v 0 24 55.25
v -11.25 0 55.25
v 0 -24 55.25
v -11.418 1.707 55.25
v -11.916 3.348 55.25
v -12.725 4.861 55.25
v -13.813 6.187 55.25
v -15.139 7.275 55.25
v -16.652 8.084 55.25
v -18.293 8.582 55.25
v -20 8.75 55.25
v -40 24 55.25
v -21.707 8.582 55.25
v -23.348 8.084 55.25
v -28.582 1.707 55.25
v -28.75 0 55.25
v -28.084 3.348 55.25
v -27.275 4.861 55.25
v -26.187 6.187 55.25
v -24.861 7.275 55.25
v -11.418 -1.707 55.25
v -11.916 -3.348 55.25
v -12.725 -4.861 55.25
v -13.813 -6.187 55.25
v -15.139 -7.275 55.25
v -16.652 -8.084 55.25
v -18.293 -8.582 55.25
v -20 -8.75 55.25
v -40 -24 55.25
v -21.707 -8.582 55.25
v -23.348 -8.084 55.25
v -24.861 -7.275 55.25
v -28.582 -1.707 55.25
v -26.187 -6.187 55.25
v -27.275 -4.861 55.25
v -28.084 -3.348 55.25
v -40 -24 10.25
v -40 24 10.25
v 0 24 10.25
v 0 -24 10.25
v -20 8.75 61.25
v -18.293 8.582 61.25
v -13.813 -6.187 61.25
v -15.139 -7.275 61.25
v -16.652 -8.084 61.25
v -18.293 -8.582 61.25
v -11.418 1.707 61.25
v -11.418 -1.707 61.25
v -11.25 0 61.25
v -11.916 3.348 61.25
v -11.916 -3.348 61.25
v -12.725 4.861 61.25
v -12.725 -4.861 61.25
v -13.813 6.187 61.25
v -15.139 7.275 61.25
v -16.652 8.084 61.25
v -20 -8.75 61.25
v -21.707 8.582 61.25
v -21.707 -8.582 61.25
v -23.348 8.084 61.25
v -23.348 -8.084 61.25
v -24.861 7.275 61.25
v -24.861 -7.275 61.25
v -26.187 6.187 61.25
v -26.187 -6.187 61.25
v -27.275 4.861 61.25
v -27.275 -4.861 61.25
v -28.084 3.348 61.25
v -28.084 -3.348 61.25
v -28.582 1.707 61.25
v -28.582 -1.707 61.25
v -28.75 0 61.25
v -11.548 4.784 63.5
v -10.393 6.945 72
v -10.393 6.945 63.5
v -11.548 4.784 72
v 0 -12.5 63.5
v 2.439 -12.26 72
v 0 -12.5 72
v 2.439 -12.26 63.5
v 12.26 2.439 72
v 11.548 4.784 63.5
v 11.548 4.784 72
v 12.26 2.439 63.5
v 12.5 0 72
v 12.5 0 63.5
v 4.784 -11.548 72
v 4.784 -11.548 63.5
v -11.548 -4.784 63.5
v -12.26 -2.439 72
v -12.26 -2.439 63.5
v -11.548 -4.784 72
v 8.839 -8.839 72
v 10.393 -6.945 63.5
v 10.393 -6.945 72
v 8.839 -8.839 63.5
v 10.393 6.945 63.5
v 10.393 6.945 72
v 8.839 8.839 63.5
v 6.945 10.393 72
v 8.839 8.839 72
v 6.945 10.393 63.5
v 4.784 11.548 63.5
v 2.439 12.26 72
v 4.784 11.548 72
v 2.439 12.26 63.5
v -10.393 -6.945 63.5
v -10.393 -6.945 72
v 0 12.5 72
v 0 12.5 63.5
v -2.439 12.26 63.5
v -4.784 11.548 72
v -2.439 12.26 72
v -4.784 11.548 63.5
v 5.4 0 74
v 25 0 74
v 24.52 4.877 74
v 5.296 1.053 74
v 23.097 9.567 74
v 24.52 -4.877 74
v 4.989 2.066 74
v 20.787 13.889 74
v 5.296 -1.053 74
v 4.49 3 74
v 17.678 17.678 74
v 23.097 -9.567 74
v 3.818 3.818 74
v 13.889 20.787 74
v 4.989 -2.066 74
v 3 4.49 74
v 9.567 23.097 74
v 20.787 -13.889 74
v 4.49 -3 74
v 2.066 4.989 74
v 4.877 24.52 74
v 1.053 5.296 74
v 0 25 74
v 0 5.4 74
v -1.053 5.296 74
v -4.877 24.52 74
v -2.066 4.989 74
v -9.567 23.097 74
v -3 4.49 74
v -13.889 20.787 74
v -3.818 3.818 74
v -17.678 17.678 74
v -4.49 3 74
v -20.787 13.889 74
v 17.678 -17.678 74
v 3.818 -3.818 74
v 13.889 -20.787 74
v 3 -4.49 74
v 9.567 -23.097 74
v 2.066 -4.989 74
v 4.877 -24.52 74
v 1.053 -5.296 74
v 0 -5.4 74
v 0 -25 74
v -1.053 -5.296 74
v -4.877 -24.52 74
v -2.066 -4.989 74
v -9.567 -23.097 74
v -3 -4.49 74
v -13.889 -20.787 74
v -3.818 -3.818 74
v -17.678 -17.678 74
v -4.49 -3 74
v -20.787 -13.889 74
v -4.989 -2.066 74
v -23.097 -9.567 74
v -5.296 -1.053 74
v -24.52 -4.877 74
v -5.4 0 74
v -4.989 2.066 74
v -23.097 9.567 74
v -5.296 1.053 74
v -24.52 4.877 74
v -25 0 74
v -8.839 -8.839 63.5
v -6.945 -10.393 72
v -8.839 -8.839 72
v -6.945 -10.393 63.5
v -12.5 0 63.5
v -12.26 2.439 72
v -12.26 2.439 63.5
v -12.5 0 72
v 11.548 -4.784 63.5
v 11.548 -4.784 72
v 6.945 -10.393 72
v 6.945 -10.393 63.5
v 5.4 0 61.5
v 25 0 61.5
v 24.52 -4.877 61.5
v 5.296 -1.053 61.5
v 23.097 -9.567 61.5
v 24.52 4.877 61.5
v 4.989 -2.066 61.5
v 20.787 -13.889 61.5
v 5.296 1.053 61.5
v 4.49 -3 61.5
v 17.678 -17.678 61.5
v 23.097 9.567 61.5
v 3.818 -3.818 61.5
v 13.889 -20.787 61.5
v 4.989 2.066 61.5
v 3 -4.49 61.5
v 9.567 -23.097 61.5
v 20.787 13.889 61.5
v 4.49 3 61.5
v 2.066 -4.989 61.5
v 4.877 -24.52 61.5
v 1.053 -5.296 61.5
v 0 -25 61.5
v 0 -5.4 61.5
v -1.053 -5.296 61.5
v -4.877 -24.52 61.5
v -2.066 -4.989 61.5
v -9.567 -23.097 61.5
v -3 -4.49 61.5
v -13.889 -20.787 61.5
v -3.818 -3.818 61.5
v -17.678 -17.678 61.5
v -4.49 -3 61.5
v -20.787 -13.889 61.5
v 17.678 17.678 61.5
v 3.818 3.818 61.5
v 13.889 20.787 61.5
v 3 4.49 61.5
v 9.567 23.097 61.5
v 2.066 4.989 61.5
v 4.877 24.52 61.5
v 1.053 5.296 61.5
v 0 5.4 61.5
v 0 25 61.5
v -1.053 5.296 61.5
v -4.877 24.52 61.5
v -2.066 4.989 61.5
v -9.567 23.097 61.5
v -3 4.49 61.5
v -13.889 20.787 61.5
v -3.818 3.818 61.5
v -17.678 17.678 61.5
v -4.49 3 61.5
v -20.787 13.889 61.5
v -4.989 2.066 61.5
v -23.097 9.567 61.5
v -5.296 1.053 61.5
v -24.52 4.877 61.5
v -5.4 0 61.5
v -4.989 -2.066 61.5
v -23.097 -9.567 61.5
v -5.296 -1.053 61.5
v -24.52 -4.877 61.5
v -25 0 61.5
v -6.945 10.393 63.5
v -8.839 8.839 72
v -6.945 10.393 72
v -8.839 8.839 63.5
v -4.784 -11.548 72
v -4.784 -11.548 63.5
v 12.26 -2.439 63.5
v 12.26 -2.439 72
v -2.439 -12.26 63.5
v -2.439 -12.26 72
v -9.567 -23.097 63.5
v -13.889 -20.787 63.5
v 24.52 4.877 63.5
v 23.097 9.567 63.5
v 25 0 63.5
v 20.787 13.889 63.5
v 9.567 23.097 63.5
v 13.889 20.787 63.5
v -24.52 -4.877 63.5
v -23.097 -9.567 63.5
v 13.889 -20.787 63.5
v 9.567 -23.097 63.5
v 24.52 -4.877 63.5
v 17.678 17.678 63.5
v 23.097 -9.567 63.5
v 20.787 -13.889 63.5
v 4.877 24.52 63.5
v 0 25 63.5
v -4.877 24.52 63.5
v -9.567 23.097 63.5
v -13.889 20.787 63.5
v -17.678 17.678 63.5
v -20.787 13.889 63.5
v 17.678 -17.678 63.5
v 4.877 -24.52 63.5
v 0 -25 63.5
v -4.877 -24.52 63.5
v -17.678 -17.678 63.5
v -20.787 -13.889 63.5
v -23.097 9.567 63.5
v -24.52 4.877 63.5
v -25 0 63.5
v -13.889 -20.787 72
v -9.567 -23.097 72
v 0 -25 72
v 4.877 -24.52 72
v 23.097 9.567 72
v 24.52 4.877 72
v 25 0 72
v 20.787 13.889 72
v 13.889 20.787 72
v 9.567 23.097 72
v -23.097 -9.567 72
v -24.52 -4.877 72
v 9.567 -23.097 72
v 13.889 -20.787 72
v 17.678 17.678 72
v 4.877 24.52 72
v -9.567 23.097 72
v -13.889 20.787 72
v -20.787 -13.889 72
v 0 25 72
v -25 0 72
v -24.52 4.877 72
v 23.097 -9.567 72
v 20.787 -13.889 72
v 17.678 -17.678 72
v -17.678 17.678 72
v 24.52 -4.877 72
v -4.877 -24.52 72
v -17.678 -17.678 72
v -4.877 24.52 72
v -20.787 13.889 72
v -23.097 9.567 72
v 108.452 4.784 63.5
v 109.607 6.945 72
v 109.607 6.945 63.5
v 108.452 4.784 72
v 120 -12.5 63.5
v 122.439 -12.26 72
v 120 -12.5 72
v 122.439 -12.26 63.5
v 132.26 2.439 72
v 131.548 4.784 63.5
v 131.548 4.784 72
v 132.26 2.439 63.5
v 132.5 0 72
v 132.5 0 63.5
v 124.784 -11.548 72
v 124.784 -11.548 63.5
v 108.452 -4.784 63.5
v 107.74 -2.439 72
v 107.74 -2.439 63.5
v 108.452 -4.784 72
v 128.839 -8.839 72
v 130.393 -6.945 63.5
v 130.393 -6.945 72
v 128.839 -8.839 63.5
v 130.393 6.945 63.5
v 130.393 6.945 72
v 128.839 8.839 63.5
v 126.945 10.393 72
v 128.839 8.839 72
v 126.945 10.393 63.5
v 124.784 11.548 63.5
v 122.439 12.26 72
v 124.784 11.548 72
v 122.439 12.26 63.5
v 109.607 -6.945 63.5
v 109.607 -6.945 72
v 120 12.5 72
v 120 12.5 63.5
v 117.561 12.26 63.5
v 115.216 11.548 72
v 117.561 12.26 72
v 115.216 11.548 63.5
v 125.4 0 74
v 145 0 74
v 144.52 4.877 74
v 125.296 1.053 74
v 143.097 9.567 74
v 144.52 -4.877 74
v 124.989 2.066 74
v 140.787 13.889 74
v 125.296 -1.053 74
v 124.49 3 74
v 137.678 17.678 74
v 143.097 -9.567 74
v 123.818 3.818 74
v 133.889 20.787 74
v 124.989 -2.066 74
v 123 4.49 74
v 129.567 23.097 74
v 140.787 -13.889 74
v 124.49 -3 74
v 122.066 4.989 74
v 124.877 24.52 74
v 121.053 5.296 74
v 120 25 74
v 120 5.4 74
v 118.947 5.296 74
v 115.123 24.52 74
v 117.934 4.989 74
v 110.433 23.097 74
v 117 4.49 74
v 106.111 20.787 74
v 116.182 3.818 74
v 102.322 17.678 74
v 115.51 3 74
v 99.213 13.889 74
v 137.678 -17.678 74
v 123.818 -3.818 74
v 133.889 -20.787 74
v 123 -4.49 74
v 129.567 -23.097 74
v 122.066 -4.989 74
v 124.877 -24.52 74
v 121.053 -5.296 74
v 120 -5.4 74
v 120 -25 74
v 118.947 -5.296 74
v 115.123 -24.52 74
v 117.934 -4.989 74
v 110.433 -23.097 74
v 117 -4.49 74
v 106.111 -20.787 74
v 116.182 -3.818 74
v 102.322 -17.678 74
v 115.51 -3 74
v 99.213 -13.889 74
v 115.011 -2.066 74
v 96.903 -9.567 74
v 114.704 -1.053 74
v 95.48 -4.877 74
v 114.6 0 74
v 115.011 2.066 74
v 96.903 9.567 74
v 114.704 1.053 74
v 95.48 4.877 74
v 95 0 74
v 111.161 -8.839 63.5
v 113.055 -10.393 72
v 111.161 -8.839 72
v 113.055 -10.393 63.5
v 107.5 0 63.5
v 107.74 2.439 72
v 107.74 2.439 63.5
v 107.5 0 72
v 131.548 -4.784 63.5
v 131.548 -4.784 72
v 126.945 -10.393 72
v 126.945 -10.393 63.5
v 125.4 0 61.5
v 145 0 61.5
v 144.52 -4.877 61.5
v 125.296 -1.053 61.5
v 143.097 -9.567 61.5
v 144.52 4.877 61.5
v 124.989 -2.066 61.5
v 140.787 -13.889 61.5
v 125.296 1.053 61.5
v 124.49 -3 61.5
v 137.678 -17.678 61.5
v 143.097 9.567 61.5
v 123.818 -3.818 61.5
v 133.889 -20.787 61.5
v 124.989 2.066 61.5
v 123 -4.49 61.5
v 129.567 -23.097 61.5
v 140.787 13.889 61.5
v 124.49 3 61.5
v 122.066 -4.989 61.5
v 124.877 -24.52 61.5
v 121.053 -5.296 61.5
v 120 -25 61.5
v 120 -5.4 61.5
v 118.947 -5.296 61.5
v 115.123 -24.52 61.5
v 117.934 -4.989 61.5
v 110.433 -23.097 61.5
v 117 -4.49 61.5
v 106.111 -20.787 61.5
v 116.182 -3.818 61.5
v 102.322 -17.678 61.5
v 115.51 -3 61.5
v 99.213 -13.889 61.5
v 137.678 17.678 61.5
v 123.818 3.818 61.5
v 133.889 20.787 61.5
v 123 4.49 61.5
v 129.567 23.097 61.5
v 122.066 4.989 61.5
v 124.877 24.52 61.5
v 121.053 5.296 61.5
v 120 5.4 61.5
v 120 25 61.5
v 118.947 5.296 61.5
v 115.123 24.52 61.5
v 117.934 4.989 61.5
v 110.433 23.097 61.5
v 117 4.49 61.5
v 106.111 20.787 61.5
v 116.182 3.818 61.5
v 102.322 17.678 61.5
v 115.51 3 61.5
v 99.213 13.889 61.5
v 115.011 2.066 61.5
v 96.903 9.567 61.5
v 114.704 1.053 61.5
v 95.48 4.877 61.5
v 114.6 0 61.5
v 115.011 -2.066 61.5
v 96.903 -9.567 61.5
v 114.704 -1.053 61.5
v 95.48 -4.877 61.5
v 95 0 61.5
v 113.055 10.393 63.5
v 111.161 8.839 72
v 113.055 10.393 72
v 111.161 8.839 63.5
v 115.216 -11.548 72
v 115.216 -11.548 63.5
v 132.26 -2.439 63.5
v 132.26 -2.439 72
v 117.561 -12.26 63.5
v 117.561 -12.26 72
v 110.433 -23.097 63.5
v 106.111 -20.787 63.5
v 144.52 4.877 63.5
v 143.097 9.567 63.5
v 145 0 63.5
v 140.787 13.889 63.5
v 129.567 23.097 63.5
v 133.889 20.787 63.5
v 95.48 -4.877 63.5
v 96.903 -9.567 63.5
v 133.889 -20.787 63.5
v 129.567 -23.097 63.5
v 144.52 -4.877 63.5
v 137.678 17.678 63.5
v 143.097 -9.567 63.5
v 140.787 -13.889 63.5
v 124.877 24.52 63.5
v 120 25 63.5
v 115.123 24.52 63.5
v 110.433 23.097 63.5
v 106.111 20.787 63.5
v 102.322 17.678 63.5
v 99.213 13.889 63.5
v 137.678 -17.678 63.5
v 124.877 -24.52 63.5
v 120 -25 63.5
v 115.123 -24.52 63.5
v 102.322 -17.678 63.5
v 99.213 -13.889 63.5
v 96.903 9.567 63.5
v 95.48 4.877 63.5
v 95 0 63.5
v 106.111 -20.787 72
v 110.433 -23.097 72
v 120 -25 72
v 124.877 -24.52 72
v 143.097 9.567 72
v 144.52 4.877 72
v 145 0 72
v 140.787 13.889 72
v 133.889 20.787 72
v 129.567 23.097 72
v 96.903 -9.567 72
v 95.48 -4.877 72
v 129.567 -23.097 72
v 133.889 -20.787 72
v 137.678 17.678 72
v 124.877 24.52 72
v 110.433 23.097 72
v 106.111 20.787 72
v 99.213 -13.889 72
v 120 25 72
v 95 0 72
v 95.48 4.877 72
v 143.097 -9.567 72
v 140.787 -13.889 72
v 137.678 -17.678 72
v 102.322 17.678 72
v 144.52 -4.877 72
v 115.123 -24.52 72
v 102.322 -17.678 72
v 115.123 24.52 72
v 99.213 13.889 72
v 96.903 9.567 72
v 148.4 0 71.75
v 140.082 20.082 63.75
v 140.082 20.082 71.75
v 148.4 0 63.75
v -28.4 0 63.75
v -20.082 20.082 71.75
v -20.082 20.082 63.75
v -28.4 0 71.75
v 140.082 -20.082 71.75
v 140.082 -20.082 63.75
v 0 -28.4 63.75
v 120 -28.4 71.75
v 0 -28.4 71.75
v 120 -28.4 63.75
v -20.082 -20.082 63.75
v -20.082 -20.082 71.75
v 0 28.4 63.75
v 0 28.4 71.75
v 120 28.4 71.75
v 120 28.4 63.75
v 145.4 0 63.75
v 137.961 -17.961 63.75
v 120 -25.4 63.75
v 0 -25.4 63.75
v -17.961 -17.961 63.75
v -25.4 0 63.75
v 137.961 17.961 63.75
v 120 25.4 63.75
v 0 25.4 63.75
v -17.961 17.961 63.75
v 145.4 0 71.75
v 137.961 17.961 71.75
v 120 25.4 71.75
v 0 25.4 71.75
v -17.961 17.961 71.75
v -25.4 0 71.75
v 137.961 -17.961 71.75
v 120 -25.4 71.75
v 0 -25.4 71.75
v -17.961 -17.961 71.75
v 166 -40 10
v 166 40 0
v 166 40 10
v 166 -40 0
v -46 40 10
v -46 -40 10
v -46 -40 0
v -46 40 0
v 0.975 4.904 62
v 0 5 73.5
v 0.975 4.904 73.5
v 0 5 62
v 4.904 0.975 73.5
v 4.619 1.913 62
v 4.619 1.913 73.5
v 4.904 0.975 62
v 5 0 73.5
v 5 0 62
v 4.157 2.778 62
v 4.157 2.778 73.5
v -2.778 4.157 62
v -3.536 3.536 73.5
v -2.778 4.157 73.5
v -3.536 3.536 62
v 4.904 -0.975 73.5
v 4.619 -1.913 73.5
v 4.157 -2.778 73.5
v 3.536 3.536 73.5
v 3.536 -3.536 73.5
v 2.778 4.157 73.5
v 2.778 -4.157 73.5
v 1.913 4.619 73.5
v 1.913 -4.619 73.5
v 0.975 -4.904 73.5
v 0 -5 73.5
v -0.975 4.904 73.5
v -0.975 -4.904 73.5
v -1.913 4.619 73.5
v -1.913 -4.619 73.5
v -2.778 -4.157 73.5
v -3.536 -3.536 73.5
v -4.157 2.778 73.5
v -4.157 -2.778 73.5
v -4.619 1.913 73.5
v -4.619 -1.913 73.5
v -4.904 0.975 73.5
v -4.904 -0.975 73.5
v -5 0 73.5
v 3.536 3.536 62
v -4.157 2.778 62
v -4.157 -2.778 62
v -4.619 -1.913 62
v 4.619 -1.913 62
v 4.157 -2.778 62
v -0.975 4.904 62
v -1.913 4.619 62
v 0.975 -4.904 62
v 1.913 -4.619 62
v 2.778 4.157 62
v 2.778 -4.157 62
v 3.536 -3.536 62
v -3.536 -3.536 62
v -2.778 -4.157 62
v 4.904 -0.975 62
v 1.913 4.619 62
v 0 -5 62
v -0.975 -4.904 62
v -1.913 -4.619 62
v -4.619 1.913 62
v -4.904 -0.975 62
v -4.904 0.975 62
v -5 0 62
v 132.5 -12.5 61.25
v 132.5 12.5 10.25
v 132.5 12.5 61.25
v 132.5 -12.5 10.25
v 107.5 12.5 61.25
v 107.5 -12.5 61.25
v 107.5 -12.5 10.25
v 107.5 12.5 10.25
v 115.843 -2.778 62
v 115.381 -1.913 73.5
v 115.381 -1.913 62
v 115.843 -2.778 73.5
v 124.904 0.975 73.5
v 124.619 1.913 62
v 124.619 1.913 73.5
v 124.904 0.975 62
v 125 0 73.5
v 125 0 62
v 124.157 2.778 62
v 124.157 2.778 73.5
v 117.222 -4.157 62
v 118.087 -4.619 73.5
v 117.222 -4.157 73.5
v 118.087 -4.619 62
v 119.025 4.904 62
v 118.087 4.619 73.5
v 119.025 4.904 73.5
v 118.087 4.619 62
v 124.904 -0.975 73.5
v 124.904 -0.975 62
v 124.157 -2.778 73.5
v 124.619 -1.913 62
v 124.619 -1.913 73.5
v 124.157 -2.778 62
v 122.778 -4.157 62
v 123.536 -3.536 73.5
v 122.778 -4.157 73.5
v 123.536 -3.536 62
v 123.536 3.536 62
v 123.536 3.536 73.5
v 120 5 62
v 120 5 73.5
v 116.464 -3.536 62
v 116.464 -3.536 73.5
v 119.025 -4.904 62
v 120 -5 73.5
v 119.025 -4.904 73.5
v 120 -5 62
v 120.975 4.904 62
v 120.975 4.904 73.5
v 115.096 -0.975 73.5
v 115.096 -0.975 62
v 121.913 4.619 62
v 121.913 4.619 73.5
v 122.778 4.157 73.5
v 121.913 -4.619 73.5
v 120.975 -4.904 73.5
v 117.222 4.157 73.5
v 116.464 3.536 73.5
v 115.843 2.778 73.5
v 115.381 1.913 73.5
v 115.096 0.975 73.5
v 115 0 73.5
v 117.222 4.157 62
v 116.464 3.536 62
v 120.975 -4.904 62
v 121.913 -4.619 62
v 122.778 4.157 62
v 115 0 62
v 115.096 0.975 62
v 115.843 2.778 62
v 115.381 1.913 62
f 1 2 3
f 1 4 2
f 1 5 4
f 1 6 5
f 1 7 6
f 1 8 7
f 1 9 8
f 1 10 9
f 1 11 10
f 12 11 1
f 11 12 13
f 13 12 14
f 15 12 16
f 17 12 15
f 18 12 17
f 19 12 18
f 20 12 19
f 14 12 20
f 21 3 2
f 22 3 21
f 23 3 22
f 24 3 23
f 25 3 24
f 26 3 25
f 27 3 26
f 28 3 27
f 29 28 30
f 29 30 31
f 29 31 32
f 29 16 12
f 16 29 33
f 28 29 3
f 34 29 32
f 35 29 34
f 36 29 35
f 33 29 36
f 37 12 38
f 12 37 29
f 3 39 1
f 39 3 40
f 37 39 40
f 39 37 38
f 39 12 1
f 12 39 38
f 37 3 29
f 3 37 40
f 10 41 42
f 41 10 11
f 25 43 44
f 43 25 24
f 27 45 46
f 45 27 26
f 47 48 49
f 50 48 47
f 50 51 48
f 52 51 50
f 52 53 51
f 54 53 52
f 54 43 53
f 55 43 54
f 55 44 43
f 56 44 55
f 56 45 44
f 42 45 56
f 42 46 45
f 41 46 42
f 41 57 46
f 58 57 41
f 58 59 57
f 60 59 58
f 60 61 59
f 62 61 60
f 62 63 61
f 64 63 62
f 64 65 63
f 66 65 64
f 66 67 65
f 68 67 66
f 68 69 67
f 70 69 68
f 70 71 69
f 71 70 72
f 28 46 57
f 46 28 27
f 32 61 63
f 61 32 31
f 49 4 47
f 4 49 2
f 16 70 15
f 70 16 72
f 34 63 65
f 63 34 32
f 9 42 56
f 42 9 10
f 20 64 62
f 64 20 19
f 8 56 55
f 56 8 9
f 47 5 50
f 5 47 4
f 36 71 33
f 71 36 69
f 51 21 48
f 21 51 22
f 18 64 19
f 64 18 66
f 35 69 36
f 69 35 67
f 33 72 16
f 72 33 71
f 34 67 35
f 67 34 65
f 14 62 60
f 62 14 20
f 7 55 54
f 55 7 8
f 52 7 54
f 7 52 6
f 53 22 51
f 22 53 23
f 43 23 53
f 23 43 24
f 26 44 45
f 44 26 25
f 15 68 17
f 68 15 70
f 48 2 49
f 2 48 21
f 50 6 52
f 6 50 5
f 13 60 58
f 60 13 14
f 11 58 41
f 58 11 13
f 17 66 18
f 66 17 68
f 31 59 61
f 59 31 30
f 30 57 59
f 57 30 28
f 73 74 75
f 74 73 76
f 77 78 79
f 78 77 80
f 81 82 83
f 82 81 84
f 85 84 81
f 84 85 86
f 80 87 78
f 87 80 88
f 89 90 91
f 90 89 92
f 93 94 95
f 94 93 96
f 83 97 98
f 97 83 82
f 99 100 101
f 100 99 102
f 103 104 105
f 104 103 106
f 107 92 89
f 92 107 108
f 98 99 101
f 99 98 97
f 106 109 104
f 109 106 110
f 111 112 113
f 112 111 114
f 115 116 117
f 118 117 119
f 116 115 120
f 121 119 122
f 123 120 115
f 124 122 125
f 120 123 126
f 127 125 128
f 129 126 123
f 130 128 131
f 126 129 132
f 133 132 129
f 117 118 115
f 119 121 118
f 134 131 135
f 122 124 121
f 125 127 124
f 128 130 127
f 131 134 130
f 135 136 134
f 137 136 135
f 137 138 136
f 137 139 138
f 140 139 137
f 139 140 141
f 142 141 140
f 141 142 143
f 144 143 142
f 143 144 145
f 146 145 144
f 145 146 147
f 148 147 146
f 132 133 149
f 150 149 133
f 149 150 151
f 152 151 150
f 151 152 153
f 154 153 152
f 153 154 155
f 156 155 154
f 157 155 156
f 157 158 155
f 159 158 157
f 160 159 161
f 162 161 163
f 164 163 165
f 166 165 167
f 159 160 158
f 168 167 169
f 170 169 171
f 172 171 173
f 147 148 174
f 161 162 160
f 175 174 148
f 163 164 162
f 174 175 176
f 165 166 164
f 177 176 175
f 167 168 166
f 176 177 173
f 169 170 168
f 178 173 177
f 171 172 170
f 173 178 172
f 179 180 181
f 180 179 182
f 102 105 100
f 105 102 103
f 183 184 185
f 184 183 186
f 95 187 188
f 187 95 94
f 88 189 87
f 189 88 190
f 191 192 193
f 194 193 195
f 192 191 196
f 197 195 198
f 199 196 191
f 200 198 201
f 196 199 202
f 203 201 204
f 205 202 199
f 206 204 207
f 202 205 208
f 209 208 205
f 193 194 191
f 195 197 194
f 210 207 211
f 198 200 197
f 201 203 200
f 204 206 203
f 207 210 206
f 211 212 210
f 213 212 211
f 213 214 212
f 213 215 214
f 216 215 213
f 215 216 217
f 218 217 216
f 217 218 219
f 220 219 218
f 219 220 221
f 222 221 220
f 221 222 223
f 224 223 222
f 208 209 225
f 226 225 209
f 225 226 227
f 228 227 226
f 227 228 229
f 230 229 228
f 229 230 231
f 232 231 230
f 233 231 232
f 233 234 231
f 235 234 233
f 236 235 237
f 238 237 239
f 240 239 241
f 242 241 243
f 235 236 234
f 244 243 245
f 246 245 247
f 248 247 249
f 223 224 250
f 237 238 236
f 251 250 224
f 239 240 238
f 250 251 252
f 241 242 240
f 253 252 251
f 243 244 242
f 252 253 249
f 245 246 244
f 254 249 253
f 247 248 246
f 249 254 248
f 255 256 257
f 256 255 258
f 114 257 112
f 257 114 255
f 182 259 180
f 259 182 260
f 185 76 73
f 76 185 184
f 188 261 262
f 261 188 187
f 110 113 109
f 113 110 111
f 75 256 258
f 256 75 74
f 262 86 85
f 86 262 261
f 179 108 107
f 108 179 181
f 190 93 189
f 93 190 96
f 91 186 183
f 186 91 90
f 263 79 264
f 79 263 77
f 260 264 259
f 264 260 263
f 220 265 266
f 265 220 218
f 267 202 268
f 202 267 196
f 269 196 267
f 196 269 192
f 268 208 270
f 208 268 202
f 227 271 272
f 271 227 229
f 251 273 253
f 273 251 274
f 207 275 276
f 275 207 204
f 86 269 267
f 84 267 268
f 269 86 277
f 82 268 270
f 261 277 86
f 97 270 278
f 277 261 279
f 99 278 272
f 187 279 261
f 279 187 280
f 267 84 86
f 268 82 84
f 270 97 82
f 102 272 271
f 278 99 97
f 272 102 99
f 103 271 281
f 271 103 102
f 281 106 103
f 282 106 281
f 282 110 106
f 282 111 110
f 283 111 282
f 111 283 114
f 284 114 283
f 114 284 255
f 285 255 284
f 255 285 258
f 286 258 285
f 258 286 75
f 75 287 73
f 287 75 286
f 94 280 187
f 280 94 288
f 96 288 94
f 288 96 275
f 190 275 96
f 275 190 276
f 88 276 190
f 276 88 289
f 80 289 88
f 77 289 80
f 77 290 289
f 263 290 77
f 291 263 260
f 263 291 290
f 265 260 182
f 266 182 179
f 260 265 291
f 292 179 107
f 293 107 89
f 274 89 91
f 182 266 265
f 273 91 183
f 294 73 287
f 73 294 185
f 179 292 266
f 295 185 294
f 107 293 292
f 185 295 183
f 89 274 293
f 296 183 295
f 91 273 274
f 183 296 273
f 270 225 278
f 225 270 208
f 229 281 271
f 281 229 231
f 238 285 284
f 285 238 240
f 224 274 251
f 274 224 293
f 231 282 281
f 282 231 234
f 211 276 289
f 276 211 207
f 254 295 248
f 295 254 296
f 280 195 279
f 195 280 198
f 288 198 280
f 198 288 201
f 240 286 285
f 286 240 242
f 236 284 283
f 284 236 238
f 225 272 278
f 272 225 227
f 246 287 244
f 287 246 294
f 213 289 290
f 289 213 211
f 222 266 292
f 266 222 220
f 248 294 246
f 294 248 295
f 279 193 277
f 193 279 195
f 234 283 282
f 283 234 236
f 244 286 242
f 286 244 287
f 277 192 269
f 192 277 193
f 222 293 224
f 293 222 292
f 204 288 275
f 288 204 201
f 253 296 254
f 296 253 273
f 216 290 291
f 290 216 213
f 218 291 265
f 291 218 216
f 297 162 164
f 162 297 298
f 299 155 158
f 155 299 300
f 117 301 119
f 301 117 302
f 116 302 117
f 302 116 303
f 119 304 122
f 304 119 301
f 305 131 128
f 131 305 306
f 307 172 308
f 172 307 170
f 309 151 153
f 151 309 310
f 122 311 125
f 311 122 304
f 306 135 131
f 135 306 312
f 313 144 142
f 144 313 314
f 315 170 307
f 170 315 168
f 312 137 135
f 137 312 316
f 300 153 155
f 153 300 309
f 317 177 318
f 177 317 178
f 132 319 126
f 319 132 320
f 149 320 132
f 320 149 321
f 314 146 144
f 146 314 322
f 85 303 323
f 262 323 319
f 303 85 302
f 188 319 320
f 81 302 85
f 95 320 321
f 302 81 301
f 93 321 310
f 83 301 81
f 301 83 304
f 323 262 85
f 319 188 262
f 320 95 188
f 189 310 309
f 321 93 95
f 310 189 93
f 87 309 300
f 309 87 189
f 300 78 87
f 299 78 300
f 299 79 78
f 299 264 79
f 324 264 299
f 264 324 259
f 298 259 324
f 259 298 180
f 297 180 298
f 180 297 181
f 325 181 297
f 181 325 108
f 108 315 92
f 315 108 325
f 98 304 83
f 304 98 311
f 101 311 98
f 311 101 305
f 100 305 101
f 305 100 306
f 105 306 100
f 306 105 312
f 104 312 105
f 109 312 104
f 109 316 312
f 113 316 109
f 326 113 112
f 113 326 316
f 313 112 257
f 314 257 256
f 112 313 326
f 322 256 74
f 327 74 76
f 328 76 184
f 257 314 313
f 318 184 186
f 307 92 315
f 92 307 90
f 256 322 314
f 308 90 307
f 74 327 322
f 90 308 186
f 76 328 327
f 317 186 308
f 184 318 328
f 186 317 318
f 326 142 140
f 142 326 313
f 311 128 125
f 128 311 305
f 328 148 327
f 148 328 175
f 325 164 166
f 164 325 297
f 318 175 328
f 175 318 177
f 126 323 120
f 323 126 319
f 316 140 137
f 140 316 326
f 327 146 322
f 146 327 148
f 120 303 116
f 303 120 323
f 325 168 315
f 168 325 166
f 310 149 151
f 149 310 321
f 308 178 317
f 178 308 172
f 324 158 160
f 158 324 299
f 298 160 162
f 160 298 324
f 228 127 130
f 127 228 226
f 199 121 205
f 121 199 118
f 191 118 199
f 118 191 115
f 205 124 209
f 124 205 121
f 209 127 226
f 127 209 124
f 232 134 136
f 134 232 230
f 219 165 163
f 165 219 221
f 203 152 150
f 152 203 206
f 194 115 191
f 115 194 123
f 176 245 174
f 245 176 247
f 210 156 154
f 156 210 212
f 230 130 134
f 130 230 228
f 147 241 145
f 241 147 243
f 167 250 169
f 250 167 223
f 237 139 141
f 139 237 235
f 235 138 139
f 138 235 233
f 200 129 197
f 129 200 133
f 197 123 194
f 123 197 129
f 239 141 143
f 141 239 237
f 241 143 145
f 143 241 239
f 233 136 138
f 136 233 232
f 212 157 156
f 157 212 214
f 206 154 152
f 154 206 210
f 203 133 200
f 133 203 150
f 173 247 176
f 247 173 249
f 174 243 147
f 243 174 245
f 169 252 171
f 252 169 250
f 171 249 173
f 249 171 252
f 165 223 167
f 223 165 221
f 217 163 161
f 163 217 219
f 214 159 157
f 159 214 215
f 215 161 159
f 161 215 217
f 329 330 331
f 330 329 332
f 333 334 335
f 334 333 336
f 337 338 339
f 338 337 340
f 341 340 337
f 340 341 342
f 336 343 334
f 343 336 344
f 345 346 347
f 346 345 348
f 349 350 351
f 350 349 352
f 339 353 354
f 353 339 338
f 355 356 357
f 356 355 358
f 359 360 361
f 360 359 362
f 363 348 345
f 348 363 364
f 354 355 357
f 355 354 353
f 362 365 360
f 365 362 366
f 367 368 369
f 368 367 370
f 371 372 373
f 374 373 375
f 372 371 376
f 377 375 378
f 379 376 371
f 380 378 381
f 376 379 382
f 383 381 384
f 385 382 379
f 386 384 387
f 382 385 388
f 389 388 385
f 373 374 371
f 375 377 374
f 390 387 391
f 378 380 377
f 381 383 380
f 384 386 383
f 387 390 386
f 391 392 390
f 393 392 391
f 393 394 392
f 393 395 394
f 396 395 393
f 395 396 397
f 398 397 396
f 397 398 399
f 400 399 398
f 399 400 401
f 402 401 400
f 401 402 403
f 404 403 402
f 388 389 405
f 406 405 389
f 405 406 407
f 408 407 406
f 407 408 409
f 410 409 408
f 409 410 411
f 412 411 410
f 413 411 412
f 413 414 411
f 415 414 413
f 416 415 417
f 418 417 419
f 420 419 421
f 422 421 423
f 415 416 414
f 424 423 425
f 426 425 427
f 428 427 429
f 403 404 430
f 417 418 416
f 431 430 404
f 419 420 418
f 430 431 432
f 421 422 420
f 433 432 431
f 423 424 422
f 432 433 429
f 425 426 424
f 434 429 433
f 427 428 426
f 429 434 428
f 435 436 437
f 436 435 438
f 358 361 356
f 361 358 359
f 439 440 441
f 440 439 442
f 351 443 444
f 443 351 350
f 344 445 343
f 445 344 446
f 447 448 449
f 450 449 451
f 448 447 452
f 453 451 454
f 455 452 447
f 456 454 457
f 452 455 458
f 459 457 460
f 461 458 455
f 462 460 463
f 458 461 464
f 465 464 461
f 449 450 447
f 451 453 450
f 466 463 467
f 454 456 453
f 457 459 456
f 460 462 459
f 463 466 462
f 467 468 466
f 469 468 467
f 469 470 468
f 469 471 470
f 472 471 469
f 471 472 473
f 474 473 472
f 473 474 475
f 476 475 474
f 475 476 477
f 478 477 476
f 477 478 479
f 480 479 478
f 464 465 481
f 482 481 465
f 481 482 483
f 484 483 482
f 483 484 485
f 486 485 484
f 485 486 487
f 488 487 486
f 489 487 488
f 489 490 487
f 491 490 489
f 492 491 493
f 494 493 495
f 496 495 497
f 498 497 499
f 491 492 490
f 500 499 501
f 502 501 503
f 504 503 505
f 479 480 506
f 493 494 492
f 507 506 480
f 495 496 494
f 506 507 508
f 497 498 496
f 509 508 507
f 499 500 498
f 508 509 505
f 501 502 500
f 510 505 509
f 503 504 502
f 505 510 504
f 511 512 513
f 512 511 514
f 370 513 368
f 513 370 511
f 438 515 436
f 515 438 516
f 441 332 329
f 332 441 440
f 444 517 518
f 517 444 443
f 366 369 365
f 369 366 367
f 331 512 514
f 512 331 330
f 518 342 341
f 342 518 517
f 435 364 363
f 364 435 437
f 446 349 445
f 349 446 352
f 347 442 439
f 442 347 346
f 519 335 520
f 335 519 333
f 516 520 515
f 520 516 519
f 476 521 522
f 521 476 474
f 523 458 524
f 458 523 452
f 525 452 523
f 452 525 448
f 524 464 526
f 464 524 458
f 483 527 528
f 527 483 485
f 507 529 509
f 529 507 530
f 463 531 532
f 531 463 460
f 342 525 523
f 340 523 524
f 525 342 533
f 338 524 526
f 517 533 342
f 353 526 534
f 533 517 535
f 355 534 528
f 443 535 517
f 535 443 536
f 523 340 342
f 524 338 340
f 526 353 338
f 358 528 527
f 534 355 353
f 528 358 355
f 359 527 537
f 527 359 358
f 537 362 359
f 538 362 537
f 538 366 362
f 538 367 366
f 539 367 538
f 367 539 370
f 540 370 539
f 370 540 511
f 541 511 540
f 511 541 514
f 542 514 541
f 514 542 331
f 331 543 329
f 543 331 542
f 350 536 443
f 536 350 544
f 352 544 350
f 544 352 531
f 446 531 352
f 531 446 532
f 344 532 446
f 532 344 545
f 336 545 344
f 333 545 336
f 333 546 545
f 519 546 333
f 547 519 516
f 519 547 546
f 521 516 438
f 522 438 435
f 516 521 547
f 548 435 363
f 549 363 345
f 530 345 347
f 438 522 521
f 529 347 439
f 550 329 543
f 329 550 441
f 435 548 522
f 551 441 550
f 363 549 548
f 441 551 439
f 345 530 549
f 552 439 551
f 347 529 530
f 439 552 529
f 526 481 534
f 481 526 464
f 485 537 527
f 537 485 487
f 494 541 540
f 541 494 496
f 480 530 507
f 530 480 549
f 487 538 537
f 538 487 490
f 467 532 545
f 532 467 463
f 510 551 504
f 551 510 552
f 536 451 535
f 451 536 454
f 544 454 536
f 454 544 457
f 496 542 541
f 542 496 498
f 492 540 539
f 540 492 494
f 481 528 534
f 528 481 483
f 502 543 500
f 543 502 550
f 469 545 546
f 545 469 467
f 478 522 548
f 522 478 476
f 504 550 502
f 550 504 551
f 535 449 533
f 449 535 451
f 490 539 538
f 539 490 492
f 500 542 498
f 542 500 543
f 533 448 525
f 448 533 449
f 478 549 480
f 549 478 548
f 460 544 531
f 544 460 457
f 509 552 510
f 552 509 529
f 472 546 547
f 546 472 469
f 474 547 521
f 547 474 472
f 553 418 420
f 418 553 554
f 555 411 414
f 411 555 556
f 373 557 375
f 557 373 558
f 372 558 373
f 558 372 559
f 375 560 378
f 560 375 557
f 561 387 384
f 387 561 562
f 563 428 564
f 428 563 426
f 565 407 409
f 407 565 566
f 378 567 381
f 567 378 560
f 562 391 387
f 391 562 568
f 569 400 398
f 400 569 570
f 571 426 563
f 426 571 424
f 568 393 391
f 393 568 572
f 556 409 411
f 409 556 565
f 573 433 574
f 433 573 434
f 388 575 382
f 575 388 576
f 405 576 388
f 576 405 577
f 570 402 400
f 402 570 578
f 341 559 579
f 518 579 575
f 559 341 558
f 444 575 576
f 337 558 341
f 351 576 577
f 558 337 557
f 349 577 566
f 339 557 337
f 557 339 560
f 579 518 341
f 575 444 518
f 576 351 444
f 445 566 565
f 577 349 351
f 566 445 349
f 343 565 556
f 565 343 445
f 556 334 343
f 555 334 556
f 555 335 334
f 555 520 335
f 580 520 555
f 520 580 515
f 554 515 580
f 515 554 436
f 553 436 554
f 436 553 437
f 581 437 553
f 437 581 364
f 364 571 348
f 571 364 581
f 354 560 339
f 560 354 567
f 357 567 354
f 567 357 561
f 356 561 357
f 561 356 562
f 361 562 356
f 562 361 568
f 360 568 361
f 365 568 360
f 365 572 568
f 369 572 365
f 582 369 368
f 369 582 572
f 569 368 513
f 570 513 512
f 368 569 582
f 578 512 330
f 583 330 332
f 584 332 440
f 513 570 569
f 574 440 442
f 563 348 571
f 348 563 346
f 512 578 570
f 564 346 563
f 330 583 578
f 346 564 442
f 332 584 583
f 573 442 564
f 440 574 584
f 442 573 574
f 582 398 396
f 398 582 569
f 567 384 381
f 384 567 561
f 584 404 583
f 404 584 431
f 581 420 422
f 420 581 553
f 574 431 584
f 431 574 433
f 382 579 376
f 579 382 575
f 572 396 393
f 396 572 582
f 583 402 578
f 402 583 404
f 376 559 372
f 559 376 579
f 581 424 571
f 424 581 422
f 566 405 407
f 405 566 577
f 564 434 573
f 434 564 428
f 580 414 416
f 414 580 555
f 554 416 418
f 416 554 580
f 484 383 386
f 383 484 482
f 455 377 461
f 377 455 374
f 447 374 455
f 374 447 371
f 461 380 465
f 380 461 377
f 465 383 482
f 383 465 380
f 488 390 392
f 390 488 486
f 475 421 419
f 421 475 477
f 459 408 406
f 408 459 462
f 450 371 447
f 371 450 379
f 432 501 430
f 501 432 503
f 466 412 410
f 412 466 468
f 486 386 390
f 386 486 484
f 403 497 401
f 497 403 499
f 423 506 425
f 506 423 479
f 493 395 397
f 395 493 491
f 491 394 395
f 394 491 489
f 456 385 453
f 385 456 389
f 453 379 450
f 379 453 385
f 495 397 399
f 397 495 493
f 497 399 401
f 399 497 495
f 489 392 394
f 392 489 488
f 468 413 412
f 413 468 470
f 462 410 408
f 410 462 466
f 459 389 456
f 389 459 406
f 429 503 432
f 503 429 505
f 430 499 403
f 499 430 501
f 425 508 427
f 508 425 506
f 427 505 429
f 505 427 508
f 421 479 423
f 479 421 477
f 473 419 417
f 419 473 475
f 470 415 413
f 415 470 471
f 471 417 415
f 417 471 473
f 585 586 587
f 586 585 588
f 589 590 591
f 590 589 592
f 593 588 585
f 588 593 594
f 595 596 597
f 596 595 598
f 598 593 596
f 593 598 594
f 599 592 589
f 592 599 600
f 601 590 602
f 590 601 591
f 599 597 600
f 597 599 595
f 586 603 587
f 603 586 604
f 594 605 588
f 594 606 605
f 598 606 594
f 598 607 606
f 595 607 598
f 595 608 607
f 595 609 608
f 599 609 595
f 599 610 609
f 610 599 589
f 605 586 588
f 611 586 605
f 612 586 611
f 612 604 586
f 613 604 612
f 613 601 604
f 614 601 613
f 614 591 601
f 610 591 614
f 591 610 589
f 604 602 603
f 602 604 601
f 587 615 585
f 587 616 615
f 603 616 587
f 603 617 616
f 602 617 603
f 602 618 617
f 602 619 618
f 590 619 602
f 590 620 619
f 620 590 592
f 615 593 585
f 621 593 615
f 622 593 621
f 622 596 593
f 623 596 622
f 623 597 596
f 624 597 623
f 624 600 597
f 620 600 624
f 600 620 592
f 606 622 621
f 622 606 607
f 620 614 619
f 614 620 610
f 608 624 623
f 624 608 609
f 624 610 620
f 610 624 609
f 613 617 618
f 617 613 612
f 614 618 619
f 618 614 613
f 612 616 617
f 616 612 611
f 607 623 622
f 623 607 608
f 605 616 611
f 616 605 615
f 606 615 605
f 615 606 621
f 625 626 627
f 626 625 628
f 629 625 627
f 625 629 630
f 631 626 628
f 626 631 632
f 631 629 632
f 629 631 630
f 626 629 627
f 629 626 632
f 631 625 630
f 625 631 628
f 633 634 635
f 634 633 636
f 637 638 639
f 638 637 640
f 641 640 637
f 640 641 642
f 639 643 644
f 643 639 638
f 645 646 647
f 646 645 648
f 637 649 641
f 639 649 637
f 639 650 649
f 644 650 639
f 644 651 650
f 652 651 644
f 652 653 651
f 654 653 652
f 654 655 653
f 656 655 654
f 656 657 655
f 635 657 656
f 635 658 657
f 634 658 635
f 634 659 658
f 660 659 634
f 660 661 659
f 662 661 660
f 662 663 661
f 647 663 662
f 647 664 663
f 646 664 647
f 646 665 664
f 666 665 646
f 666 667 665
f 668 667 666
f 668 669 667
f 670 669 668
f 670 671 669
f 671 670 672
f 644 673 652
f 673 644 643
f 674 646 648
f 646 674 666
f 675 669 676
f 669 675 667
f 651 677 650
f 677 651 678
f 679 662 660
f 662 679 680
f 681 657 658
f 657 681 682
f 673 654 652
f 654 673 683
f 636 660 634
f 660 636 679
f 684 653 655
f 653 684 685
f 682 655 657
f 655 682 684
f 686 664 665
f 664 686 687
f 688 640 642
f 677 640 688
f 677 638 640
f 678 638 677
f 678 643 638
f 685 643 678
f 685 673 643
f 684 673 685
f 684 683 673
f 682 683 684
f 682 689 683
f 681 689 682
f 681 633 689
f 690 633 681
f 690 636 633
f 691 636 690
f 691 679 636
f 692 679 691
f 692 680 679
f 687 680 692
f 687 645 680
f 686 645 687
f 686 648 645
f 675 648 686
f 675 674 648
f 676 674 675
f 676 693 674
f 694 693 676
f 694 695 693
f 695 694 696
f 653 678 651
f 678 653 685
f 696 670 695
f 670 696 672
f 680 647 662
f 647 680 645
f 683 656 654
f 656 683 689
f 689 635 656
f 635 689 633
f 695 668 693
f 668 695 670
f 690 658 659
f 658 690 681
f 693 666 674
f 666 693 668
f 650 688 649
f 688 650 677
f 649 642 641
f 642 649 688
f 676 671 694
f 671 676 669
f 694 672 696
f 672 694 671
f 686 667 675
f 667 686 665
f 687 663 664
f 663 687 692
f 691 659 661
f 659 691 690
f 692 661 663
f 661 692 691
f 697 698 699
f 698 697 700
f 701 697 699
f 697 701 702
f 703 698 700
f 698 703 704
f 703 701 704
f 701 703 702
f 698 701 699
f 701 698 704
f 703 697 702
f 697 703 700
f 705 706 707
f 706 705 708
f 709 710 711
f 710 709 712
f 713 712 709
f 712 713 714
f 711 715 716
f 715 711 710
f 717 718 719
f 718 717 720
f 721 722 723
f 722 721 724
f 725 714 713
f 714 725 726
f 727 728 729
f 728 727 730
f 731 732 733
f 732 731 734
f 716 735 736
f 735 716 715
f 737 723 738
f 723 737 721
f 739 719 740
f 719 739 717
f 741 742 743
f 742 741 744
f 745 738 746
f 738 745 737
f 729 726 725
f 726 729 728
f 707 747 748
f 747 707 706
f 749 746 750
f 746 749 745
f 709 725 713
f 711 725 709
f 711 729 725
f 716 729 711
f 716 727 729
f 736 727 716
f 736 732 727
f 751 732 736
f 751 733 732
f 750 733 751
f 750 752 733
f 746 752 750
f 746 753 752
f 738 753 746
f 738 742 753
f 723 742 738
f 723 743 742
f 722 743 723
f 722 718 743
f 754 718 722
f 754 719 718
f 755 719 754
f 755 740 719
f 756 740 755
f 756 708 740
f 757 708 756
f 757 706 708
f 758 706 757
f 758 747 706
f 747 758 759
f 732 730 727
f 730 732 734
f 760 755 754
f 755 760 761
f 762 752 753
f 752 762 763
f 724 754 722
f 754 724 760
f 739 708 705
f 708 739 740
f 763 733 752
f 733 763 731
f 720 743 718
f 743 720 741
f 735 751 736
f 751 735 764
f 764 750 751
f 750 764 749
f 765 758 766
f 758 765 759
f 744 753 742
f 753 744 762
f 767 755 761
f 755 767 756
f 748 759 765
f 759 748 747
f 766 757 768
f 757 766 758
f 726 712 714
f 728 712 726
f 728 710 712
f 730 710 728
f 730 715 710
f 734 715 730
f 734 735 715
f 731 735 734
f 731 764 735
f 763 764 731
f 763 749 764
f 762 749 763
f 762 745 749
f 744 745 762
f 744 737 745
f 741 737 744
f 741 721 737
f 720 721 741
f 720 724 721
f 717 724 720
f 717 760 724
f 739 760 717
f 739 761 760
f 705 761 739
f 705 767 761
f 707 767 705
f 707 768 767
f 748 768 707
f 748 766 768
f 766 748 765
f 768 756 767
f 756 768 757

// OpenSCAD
$fn = 32;

// ------------------------------------------------------------------------
// Motor belt drive: span 120 mm, pulleys d50, belt 8 mm wide
// Every part is its own module, assembly() places every instance.
// ------------------------------------------------------------------------

// --- part 1 ---
module base_plate() {
  difference() {
    translate([-106, -40, 0]) cube([212, 80, 10]);
  }
}

// --- part 2 ---
module motor() {
  union() {
    translate([-22.5, -24, 0]) cube([45, 48, 40]);
    translate([25.5, 0, 20]) rotate([0, 90, 0]) cylinder(h = 6, d = 17.5, center = true);
  }
}

// --- part 3 ---
module drive_shaft() {
  translate([0, 0, -5.75]) cylinder(h = 11.5, d = 10);
}

// --- part 4 ---
module pulley_drive() {
  difference() {
    union() {
      cylinder(h = 12.5, d = 25);
      cylinder(h = 2, d = 50);
      translate([0, 0, 10.5]) cylinder(h = 2, d = 50);
    }
    translate([0, 0, -1]) cylinder(h = 14.5, d = 10.8);
  }
}

// --- part 5 ---
module idler_post() {
  translate([-12.5, -12.5, 0]) cube([25, 25, 51]);
}

// --- part 6 ---
module driven_shaft() {
  translate([0, 0, -5.75]) cylinder(h = 11.5, d = 10);
}

// --- part 7 ---
module pulley_driven() {
  difference() {
    union() {
      cylinder(h = 12.5, d = 25);
      cylinder(h = 2, d = 50);
      translate([0, 0, 10.5]) cylinder(h = 2, d = 50);
    }
    translate([0, 0, -1]) cylinder(h = 14.5, d = 10.8);
  }
}

// --- part 8 ---
module drive_belt() {
  difference() {
    linear_extrude(height = 8) polygon(points = concat([for (a = [90 : 45 : 270]) [28.4 * cos(a), 28.4 * sin(a)]], [for (a = [270 : 45 : 450]) [120 + 28.4 * cos(a), 28.4 * sin(a)]]));
    translate([0, 0, -1]) linear_extrude(height = 10) polygon(points = concat([for (a = [90 : 45 : 270]) [25.4 * cos(a), 25.4 * sin(a)]], [for (a = [270 : 45 : 450]) [120 + 25.4 * cos(a), 25.4 * sin(a)]]));
  }
}

// --- assembly ---
module assembly() {
  color([0.80, 0.24, 0.20]) translate([60, 0, 0]) rotate([0, 0, 0]) base_plate();
  color([0.20, 0.45, 0.75]) translate([0, 0, 32.75]) rotate([0, 270, 0]) motor();
  color([0.25, 0.62, 0.32]) translate([0, 0, 67.75]) rotate([0, 0, 0]) drive_shaft();
  color([0.92, 0.70, 0.18]) translate([0, 0, 61.5]) rotate([0, 0, 0]) pulley_drive();
  color([0.58, 0.35, 0.70]) translate([120, 0, 10.25]) rotate([0, 0, 0]) idler_post();
  color([0.16, 0.66, 0.66]) translate([120, 0, 67.75]) rotate([0, 0, 0]) driven_shaft();
  color([0.85, 0.48, 0.18]) translate([120, 0, 61.5]) rotate([0, 0, 0]) pulley_driven();
  color([0.55, 0.60, 0.65]) translate([0, 0, 63.75]) rotate([0, 0, 0]) drive_belt();
}

assembly();
